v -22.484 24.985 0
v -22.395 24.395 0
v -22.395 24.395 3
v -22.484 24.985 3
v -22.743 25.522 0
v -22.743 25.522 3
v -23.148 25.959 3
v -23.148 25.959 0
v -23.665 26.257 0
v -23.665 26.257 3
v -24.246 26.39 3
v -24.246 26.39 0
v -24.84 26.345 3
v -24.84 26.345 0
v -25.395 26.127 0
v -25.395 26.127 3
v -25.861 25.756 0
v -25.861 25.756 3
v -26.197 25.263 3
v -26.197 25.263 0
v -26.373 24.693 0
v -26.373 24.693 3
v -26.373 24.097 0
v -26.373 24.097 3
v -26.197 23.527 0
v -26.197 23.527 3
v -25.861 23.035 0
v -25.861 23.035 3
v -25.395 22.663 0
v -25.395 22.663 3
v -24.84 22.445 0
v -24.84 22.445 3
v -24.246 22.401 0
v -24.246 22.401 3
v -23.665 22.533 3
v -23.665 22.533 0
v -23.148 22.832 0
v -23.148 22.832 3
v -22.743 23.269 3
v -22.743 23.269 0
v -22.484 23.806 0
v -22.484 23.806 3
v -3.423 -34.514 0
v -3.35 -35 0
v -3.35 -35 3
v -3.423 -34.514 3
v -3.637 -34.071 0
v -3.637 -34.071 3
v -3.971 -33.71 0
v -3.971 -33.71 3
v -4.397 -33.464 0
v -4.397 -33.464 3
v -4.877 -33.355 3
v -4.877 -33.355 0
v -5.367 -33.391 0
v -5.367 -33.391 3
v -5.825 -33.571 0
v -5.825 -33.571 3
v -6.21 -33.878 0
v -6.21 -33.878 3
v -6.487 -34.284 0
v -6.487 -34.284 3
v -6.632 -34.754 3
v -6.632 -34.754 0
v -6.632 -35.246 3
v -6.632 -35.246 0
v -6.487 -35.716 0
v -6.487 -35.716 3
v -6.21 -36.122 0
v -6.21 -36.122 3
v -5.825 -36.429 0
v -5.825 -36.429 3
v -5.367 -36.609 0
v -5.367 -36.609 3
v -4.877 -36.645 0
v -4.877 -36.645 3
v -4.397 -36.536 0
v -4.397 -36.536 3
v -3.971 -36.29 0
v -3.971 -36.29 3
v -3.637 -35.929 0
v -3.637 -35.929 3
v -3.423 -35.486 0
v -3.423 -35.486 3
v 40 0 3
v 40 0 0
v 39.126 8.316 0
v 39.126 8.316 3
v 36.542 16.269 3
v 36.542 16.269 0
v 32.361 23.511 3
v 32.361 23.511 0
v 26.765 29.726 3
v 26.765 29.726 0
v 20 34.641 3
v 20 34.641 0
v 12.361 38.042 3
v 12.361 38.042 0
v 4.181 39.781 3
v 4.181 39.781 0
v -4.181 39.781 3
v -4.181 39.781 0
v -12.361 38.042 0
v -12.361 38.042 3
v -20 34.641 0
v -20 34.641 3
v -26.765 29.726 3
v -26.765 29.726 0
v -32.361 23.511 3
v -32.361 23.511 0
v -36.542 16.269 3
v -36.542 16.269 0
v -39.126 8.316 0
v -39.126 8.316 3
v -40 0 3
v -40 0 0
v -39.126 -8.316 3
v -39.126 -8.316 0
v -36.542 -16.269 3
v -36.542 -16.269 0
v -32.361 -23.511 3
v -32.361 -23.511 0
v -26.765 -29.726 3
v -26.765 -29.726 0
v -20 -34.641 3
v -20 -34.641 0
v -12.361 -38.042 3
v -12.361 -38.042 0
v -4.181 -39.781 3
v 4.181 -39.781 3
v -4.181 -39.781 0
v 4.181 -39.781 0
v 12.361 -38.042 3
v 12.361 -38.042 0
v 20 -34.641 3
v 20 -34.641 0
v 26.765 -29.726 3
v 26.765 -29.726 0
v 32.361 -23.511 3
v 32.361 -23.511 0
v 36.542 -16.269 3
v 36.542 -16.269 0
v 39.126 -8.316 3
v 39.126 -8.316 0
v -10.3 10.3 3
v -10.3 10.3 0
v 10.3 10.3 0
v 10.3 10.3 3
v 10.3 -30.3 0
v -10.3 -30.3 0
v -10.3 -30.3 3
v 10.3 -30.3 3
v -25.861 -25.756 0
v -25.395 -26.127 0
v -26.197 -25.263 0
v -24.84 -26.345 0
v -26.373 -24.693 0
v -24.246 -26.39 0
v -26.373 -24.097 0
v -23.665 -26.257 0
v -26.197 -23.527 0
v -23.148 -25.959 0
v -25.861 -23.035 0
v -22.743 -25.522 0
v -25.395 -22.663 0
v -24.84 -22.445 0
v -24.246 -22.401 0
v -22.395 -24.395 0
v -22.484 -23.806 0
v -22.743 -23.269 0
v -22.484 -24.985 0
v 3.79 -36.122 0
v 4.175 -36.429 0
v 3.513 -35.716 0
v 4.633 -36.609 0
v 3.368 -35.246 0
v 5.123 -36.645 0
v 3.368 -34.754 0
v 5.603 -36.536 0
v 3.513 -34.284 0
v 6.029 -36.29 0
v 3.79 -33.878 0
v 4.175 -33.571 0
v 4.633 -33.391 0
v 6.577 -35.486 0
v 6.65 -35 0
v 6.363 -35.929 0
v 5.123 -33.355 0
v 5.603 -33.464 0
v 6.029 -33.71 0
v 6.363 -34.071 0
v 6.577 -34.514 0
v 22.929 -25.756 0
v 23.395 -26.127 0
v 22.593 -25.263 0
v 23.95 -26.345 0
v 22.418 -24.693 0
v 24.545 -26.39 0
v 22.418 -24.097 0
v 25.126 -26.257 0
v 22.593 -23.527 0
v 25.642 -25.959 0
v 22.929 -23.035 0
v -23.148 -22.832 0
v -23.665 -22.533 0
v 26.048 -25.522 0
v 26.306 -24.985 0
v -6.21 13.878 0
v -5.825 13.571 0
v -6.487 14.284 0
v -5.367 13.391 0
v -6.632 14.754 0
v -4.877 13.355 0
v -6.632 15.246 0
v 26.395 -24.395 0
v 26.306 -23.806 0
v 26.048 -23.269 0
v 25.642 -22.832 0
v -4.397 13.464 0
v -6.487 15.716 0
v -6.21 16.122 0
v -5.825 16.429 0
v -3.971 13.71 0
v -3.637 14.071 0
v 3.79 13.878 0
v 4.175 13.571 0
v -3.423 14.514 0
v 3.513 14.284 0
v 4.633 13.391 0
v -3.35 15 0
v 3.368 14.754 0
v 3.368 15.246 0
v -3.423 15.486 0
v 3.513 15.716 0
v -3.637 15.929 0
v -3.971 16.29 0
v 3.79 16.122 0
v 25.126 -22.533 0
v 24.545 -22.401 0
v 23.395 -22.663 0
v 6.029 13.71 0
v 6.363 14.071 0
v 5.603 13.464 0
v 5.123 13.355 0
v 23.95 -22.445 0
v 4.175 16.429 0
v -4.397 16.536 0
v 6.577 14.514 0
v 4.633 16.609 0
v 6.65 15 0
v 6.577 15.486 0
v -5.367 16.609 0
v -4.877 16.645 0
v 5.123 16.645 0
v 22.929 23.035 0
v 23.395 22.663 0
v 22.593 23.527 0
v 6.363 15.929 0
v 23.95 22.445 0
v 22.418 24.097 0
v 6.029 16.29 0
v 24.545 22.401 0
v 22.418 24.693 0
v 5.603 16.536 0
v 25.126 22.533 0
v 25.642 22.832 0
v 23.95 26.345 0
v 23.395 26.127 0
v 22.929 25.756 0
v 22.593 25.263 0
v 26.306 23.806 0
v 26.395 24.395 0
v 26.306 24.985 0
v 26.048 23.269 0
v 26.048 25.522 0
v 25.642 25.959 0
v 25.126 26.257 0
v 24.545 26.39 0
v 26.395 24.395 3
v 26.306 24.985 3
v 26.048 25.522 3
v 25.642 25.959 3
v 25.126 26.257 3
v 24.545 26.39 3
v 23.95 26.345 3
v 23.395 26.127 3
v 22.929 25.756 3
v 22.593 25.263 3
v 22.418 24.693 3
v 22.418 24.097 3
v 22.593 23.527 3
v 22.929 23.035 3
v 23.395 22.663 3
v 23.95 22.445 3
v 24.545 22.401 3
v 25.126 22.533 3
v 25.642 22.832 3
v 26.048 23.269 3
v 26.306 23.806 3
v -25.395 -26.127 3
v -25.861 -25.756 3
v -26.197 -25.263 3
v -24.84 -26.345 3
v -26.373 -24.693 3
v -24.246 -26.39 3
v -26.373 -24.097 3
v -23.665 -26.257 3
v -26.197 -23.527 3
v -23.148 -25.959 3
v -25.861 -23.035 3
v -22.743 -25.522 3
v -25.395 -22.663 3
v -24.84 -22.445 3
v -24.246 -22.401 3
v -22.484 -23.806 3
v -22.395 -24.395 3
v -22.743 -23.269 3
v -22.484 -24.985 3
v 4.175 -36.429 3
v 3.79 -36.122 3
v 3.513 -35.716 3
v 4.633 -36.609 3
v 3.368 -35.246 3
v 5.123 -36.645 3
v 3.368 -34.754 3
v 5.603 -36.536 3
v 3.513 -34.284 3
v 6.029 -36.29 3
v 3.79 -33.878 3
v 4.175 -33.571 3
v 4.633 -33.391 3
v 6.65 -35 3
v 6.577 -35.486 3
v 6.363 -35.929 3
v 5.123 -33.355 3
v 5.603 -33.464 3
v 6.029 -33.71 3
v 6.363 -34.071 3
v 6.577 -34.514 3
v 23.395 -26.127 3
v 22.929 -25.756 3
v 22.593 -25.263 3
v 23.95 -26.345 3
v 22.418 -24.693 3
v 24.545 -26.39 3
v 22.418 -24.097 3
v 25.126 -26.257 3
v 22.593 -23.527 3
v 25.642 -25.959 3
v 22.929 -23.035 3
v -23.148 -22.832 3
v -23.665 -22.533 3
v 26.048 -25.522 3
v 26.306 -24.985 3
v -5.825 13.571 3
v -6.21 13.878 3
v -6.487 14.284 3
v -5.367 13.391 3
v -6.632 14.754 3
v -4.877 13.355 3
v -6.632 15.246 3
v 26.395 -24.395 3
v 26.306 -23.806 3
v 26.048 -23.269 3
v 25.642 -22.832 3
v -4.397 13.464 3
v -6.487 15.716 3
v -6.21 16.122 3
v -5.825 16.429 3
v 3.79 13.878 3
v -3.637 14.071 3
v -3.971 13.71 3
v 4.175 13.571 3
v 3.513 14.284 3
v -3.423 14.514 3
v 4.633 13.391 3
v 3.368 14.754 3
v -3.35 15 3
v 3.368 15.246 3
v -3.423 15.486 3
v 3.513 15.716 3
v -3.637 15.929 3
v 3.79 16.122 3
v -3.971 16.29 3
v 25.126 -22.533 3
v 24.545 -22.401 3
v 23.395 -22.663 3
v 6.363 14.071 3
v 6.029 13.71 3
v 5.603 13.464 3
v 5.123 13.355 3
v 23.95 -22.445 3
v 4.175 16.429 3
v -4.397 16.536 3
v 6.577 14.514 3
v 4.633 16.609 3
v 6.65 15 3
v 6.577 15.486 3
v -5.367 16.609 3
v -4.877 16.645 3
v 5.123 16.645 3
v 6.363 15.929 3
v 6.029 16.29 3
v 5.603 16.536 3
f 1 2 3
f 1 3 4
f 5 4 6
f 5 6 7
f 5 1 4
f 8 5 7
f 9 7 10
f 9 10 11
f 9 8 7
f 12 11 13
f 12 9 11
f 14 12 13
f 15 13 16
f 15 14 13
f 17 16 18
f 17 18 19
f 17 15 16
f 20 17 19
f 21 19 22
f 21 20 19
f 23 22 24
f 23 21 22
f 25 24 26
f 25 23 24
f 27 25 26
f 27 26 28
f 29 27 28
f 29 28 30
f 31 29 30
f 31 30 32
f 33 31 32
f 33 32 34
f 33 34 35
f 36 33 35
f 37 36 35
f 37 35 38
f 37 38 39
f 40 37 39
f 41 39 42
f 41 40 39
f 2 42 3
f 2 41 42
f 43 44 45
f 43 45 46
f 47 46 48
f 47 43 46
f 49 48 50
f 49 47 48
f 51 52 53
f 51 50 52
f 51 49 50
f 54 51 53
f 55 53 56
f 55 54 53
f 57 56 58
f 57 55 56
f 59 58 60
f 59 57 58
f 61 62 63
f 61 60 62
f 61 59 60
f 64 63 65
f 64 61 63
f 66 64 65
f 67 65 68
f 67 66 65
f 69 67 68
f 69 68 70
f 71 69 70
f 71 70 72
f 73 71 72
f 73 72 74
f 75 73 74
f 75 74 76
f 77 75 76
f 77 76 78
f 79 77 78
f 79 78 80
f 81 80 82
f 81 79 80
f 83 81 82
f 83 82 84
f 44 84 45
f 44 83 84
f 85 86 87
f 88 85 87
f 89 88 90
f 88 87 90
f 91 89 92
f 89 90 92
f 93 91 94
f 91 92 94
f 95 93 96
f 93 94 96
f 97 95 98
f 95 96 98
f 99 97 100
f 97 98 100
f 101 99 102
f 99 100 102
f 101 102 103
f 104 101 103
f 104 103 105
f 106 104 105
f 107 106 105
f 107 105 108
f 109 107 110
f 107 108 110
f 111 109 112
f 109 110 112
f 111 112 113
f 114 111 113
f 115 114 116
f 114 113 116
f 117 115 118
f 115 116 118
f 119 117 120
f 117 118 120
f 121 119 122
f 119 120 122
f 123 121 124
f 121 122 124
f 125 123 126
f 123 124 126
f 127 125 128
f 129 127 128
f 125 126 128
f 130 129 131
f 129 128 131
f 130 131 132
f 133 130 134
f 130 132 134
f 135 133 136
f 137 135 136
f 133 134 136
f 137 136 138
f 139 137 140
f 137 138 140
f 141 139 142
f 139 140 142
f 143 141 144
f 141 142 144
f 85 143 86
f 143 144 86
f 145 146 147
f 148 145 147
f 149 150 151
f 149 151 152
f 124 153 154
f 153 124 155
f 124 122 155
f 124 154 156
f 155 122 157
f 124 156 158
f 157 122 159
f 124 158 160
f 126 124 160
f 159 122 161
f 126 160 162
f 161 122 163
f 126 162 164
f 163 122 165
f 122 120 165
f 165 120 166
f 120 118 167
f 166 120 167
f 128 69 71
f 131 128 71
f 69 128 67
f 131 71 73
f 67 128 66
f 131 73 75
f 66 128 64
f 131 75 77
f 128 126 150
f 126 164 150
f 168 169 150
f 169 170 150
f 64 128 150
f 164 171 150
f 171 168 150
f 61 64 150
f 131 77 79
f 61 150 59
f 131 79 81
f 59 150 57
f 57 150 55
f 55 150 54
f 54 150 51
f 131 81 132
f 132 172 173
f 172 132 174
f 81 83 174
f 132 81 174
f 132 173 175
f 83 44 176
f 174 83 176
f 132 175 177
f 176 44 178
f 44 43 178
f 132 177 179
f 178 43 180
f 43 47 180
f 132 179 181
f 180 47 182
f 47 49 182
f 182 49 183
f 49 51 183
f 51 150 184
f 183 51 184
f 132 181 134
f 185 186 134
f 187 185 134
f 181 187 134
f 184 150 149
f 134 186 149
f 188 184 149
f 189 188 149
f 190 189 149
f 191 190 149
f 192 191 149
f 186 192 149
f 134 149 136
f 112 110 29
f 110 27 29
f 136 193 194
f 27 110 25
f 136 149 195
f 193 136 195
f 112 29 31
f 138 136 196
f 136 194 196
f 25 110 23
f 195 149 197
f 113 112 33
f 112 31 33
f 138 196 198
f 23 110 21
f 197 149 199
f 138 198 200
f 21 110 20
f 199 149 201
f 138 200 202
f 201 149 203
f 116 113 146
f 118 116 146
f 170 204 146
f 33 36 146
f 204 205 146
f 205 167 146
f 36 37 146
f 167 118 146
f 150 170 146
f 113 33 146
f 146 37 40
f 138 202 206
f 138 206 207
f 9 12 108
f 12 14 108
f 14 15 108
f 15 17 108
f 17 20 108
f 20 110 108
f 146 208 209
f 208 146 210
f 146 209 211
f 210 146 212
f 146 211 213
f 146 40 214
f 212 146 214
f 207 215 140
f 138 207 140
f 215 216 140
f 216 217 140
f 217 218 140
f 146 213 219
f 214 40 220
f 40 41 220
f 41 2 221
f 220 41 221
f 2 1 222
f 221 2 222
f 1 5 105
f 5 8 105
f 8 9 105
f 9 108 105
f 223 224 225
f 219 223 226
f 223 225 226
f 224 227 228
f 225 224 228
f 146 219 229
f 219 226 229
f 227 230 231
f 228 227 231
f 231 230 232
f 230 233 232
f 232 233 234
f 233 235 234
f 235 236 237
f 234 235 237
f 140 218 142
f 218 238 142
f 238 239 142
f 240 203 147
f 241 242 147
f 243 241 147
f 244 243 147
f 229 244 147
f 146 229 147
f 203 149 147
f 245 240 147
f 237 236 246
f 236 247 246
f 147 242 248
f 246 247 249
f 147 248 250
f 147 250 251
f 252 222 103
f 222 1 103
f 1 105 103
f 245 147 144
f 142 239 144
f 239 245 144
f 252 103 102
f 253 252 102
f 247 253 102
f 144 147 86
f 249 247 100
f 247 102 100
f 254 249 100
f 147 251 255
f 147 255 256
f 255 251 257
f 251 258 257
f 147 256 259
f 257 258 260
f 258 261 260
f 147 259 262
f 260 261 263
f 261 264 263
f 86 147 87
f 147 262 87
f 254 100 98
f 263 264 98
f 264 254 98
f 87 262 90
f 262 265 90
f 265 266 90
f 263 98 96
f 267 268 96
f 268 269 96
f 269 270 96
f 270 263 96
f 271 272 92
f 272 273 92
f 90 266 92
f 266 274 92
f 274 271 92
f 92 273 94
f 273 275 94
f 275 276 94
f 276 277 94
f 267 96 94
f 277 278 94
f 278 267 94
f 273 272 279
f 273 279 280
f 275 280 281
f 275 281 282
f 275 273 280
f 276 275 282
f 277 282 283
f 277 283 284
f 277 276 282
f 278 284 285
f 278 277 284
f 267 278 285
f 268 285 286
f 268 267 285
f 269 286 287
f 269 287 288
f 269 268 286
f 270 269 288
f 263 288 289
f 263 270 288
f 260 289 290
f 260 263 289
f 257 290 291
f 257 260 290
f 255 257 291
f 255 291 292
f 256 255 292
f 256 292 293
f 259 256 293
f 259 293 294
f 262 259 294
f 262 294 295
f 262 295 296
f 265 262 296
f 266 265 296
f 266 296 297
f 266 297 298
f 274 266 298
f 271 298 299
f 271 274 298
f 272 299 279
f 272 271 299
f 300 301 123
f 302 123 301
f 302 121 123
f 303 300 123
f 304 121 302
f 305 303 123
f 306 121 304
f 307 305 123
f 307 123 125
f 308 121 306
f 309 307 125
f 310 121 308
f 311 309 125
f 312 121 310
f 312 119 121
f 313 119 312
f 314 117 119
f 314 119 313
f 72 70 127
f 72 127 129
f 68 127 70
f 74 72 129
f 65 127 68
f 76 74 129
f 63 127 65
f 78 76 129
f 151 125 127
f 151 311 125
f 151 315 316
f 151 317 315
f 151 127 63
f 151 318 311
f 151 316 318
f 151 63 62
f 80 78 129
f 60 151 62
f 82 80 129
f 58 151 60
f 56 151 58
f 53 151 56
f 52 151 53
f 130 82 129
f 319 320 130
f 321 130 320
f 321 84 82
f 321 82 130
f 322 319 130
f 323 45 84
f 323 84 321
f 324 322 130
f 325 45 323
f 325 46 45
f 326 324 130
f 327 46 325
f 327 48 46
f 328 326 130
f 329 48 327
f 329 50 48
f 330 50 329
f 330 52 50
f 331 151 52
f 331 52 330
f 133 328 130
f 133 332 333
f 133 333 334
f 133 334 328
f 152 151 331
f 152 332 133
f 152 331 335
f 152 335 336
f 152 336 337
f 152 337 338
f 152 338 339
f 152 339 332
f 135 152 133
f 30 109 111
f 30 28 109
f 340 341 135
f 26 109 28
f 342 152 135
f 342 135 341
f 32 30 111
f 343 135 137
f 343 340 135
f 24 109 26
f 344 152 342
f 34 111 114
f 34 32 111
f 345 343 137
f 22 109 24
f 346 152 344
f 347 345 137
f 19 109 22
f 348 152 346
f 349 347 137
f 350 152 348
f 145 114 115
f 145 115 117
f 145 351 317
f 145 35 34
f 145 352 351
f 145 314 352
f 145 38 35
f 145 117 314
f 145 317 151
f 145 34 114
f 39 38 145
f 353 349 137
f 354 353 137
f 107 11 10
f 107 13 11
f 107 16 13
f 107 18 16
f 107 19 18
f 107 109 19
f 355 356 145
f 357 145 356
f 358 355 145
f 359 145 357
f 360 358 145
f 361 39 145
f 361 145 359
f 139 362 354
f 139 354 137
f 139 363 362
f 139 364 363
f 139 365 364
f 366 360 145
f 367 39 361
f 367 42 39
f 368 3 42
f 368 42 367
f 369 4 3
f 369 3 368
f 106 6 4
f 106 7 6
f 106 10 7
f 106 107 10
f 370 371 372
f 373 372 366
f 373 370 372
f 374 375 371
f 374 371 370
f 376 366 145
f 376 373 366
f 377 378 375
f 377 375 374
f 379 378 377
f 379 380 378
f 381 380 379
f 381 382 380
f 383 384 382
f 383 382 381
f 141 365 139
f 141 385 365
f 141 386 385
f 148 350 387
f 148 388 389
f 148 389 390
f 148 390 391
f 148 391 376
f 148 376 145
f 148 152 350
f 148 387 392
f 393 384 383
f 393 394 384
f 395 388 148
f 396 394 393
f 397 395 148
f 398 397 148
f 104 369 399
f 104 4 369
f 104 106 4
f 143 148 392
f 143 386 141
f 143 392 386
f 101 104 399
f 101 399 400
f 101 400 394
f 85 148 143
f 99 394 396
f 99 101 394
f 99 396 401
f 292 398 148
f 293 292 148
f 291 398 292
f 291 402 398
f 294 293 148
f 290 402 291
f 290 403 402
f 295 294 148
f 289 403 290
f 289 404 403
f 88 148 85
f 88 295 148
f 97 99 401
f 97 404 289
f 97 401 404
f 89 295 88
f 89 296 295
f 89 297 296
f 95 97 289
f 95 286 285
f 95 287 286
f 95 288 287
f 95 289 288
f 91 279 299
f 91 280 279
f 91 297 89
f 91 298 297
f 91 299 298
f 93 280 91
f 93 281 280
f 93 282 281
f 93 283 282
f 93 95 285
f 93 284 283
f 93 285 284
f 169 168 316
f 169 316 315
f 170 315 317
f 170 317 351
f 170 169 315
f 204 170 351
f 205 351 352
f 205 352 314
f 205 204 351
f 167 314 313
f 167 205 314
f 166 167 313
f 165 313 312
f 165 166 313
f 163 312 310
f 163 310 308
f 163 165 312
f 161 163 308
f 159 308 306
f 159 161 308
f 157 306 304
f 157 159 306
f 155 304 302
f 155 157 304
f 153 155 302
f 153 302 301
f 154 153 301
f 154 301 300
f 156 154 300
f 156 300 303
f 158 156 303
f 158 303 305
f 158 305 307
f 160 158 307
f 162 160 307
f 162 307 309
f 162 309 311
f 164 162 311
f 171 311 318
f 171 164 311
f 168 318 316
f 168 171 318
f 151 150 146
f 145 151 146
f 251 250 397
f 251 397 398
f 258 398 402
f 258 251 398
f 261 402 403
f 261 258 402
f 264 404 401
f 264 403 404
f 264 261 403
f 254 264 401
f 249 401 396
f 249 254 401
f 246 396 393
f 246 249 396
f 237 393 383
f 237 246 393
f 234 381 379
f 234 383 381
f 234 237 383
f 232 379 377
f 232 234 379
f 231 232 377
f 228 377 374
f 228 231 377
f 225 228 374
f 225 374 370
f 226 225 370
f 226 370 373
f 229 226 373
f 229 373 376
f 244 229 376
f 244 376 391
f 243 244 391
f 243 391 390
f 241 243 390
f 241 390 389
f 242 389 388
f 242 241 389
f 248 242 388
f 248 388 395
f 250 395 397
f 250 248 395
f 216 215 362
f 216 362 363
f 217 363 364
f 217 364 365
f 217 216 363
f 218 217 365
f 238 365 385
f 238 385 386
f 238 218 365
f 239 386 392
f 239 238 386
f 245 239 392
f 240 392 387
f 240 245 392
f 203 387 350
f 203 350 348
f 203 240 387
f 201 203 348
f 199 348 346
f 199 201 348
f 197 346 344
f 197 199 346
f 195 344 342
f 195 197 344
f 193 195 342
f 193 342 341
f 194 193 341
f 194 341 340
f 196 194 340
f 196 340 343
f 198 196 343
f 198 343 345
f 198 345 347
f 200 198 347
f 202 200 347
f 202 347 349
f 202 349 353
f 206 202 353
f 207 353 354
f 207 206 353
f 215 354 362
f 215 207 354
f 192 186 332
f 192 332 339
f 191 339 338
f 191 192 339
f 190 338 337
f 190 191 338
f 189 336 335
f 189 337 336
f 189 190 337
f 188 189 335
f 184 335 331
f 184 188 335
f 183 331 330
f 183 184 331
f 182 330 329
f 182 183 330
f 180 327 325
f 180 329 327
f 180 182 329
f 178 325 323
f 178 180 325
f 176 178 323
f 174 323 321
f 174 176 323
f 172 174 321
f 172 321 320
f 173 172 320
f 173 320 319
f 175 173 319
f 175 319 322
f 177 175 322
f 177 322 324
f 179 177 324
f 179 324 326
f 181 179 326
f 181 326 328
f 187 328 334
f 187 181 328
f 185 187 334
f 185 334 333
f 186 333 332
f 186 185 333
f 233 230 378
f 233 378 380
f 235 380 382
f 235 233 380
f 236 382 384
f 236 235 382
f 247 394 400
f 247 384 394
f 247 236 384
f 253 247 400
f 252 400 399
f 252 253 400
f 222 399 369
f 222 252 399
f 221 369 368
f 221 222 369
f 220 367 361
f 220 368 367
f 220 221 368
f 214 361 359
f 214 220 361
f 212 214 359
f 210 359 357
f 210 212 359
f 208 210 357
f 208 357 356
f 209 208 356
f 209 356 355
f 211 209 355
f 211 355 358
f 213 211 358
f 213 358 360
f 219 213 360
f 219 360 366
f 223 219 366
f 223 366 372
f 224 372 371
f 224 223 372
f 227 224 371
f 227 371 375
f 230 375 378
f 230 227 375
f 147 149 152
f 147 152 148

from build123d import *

# Parameters (mm, degrees)
PLATE_D80_HOLES_D4_DIAGONAL69_R      = 40
PLATE_D80_HOLES_D4_DIAGONAL69_R_2    = 2
PLATE_3MM_DEPTH                      = 3
SERVO_HOUSING_THROUGH_CUT_START      = -0.1
SERVO_HOUSING_PROFILE_40P6X20P6_W    = 20.6
SERVO_HOUSING_PROFILE_40P6X20P6_H    = 40.6
SERVO_HOUSING_THROUGH_CUT_DEPTH      = 3.2
SERVO_4XD3P3_THROUGH_HOLES_START     = -0.1
SERVO_EARS_50X10_CENTERED_ON_SHAFT_R = 1.65
SERVO_4XD3P3_THROUGH_HOLES_DEPTH     = 3.2


with BuildPart() as part:
    # Plate_D80_Holes_D4_Diagonal69 → Plate_3mm (new body)
    with BuildSketch(Plane.XY):
        Circle(PLATE_D80_HOLES_D4_DIAGONAL69_R)
        with Locations((-24.395183951, -24.395183951)):
            Circle(PLATE_D80_HOLES_D4_DIAGONAL69_R_2, mode=Mode.SUBTRACT)
        with Locations((-24.395183951, 24.395183951)):
            Circle(PLATE_D80_HOLES_D4_DIAGONAL69_R_2, mode=Mode.SUBTRACT)
        with Locations((24.395183951, -24.395183951)):
            Circle(PLATE_D80_HOLES_D4_DIAGONAL69_R_2, mode=Mode.SUBTRACT)
        with Locations((24.395183951, 24.395183951)):
            Circle(PLATE_D80_HOLES_D4_DIAGONAL69_R_2, mode=Mode.SUBTRACT)
    extrude(amount=PLATE_3MM_DEPTH)

    # Servo_Housing_Profile_40p6x20p6 → Servo_Housing_Through_Cut (cut)
    with BuildSketch(Plane.XY.offset(SERVO_HOUSING_THROUGH_CUT_START)):
        with Locations((0, -10)):
            Rectangle(SERVO_HOUSING_PROFILE_40P6X20P6_W, SERVO_HOUSING_PROFILE_40P6X20P6_H)
    extrude(amount=SERVO_HOUSING_THROUGH_CUT_DEPTH, mode=Mode.SUBTRACT)

    # Servo_Ears_50x10_Centered_on_Shaft → Servo_4xD3p3_Through_Holes (cut)
    with BuildSketch(Plane.XY.offset(SERVO_4XD3P3_THROUGH_HOLES_START)):
        with Locations((-5, -35)):
            Circle(SERVO_EARS_50X10_CENTERED_ON_SHAFT_R)
        with Locations((-5, 15)):
            Circle(SERVO_EARS_50X10_CENTERED_ON_SHAFT_R)
        with Locations((5, -35)):
            Circle(SERVO_EARS_50X10_CENTERED_ON_SHAFT_R)
        with Locations((5, 15)):
            Circle(SERVO_EARS_50X10_CENTERED_ON_SHAFT_R)
    extrude(amount=SERVO_4XD3P3_THROUGH_HOLES_DEPTH, mode=Mode.SUBTRACT)


solid = part.part
